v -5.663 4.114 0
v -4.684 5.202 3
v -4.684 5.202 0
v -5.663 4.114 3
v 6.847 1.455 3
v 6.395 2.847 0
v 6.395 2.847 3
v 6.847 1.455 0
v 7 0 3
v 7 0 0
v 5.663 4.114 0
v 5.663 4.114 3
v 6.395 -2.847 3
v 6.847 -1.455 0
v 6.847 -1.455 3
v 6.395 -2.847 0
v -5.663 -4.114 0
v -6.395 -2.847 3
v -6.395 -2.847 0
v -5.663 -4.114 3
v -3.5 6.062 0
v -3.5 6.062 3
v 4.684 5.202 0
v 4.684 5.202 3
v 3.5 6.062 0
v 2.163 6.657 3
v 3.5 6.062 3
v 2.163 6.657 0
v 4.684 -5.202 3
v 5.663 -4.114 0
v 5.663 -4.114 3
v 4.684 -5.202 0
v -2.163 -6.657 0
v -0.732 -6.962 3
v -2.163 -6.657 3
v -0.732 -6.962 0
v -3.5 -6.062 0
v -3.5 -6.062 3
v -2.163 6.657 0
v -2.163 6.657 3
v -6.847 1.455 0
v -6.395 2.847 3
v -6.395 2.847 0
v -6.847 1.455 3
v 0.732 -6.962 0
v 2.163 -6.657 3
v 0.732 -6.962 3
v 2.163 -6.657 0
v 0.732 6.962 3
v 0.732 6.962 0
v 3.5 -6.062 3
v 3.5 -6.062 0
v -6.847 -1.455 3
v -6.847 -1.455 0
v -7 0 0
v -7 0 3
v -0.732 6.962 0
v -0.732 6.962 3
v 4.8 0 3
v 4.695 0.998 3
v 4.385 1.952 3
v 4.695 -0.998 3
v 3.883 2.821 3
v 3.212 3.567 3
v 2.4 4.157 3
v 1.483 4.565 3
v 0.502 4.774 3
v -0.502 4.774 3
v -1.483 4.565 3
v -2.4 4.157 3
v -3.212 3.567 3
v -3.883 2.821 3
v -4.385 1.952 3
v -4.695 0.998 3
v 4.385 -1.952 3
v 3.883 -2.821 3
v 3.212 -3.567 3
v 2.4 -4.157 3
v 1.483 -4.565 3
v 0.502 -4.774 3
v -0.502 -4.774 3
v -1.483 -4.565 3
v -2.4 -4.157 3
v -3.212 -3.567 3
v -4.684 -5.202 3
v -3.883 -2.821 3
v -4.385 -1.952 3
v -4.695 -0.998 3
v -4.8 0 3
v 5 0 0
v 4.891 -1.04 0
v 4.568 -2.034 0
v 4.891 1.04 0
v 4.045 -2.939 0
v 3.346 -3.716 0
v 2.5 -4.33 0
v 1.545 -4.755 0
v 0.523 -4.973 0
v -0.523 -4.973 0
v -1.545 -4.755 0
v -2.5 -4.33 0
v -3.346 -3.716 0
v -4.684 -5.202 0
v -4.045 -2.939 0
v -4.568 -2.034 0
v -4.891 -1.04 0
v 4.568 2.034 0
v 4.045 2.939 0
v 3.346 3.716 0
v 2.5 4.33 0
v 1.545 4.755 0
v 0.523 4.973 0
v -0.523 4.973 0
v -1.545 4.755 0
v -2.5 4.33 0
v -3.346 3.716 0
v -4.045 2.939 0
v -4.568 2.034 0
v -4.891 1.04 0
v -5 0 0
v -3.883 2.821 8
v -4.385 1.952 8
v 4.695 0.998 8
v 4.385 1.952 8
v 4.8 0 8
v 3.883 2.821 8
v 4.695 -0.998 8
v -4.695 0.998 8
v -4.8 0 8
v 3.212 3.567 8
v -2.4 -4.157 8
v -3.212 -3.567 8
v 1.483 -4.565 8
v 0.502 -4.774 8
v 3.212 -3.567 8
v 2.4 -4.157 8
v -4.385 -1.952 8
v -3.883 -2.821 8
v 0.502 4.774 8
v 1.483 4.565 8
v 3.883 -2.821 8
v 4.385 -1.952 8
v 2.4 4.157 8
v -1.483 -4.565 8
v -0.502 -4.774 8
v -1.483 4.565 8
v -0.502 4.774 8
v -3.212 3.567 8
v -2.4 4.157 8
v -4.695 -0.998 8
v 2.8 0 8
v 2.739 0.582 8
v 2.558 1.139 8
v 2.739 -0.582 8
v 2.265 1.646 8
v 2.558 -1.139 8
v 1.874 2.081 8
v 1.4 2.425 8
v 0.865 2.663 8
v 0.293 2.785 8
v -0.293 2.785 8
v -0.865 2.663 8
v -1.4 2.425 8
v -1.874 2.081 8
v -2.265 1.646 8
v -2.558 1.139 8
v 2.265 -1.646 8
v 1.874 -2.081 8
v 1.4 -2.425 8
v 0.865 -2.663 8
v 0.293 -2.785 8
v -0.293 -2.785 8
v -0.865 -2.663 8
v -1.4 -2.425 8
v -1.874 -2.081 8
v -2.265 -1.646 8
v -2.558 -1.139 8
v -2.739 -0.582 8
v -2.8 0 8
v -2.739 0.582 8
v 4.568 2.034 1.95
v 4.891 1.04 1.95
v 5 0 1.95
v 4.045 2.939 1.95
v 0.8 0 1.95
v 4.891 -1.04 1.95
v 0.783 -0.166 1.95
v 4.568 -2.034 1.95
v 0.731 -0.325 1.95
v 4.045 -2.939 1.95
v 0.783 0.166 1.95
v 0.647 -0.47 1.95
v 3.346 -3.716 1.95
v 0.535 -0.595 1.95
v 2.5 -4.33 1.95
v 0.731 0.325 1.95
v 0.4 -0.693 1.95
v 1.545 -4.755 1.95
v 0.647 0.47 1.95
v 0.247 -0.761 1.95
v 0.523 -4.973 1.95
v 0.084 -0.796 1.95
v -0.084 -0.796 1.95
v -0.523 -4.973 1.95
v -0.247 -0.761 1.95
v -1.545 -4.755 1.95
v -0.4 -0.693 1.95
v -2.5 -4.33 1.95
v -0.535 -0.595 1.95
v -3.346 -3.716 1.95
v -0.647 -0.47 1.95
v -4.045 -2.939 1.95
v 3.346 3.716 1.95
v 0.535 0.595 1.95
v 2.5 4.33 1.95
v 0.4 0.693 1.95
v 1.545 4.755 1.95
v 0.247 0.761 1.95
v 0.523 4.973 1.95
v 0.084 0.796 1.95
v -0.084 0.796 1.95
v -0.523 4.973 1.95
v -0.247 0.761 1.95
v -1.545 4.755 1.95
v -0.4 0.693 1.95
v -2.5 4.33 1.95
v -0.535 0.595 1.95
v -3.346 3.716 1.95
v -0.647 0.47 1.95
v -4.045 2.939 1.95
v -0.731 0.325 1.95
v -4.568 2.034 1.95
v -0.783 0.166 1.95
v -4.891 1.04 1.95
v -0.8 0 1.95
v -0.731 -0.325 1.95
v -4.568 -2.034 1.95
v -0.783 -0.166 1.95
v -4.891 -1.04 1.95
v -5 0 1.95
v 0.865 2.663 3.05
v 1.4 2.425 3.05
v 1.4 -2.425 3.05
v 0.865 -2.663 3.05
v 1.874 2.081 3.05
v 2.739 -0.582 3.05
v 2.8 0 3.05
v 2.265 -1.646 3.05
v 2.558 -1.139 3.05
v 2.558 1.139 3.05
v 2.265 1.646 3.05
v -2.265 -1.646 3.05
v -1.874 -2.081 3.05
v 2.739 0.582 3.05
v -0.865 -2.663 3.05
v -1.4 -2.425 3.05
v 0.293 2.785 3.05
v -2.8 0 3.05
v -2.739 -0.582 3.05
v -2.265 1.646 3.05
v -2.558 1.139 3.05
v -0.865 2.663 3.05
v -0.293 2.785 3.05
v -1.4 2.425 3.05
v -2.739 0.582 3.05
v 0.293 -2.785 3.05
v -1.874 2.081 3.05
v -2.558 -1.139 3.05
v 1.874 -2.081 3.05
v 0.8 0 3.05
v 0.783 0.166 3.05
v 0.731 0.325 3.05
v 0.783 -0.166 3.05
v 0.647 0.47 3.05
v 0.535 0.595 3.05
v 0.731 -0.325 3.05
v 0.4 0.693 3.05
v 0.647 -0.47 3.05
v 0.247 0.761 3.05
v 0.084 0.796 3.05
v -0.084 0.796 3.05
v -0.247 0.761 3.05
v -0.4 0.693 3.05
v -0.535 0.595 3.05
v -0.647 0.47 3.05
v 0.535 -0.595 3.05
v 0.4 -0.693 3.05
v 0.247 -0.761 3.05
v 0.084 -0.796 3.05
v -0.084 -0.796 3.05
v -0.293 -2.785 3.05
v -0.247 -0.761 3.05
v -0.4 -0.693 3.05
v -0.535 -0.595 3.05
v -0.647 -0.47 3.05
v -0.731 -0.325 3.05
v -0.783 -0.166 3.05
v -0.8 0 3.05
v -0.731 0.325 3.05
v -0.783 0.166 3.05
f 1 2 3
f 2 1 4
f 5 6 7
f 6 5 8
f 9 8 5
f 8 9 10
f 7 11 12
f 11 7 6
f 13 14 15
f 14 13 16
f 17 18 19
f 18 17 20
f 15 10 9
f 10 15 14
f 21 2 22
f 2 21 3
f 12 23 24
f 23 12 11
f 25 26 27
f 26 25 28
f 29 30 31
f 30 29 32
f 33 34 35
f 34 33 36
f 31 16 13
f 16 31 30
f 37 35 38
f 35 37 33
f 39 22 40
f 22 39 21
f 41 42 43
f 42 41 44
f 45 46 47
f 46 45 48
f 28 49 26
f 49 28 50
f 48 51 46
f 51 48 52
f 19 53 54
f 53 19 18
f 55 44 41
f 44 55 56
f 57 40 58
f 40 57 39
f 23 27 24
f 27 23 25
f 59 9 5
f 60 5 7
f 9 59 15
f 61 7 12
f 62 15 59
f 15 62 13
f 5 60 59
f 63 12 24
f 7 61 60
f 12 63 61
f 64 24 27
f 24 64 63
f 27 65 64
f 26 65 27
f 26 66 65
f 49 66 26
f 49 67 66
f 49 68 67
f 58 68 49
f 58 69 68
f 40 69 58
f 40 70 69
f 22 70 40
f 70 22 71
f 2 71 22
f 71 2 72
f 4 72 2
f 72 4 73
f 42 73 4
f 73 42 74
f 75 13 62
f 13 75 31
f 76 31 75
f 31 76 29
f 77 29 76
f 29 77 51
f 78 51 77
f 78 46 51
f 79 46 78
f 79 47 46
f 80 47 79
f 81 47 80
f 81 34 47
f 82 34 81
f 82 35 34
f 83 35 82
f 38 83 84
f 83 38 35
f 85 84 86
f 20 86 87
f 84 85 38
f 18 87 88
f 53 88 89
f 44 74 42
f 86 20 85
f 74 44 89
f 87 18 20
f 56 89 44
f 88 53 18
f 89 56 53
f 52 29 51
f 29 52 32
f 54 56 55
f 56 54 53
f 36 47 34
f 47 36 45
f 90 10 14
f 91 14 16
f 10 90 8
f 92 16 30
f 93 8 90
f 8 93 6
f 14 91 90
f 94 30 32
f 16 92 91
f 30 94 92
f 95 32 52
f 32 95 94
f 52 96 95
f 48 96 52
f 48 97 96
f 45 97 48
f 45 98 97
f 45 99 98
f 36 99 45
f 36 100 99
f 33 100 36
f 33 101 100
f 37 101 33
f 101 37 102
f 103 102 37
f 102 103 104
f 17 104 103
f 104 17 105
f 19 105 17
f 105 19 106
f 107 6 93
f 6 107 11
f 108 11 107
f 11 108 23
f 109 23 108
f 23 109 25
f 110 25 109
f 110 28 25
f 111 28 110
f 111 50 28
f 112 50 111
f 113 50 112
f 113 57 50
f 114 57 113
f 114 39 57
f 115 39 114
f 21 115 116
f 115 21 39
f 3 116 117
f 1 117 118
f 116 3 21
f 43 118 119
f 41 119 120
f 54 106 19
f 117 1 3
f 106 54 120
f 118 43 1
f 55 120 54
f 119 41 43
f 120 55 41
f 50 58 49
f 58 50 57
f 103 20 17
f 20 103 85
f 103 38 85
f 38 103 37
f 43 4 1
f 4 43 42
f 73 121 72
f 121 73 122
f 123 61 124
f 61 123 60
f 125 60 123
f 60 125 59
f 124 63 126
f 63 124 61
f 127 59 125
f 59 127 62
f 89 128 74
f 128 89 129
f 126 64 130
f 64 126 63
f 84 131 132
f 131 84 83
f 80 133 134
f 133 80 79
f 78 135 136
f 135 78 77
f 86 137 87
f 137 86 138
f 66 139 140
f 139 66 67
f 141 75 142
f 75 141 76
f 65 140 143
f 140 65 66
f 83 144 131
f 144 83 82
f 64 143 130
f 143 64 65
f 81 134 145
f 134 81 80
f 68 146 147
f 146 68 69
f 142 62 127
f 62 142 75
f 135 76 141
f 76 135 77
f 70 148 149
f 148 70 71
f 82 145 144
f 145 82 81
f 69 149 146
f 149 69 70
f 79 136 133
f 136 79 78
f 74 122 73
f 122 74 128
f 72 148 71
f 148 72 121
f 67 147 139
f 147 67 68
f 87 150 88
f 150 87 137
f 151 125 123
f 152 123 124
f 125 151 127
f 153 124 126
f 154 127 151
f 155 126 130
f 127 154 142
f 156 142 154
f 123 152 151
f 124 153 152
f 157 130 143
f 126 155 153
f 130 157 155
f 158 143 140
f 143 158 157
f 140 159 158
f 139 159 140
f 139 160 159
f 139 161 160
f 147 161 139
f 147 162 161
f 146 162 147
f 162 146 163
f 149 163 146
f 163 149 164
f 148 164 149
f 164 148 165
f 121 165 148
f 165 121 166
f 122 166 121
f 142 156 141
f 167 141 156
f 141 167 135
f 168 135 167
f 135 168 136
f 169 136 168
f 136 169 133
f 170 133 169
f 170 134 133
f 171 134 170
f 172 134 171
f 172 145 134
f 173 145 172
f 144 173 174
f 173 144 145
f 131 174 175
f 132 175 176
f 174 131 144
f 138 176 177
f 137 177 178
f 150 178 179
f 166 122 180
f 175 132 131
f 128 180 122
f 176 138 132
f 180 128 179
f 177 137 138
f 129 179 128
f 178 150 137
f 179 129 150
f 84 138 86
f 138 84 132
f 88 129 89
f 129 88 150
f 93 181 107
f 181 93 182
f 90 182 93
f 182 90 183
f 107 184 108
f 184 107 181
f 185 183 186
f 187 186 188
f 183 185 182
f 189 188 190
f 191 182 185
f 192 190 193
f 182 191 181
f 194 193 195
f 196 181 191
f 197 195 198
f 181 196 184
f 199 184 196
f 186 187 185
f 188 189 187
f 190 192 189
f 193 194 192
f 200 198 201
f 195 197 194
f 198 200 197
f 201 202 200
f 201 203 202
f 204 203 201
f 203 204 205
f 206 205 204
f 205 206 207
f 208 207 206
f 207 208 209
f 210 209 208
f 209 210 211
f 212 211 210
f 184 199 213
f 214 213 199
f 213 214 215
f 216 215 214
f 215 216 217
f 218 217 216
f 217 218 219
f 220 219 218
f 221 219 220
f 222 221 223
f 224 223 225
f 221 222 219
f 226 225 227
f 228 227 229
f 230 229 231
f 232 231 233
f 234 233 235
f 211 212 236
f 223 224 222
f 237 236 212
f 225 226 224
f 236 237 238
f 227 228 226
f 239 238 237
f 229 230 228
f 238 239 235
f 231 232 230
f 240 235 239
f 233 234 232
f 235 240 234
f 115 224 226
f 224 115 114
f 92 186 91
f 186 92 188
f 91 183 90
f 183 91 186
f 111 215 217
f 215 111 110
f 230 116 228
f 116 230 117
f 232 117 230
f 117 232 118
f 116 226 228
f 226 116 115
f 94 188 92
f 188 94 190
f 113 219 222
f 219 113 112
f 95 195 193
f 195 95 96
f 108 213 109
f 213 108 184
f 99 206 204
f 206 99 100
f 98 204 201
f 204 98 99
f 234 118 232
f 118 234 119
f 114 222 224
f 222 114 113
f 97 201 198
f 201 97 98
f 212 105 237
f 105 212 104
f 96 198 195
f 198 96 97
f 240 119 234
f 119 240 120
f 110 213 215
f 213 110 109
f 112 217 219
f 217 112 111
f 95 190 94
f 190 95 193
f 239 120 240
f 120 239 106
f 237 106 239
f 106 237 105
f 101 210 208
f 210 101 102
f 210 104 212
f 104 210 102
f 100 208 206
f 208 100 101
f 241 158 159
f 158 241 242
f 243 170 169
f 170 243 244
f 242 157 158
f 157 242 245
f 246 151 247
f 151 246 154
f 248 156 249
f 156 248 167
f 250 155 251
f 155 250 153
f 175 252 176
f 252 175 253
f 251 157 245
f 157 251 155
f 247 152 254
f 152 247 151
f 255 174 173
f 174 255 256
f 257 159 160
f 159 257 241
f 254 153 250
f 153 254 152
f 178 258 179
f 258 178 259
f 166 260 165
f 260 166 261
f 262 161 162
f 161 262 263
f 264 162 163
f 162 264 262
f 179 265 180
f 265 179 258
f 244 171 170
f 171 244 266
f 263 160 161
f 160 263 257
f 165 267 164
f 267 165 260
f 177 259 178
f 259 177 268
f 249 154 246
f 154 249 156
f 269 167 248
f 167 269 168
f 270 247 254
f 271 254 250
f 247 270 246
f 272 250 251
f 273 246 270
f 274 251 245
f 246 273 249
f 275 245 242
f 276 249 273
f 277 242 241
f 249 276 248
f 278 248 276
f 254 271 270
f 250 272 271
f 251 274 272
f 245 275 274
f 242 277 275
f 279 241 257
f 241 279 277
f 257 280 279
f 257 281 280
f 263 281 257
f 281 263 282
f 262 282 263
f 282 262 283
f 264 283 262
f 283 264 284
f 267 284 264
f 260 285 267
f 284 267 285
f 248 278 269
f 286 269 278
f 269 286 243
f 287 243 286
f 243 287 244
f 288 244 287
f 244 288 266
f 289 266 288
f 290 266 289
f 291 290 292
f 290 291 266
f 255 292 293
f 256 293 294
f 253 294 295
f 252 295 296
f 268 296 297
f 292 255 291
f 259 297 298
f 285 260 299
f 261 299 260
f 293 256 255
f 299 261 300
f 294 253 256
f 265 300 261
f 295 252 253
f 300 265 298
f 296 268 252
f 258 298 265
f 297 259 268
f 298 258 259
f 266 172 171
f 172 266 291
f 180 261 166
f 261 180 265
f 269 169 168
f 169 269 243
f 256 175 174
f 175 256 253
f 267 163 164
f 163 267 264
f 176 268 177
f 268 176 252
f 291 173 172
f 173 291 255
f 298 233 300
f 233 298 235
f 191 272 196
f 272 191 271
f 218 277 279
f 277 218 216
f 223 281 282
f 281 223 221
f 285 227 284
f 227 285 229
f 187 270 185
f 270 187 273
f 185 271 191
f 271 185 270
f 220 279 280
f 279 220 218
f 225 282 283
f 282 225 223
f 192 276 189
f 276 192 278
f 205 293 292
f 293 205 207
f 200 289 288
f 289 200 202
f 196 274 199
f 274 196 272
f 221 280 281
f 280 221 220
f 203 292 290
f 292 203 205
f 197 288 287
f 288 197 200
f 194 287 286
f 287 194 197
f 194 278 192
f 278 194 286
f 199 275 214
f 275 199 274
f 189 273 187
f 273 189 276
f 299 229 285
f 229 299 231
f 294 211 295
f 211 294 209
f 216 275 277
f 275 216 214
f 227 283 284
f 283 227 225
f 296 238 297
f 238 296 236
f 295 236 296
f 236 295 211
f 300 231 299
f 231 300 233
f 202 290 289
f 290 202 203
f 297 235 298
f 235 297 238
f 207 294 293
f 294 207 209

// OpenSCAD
// magnet 10x2 holder on 6mm axis with thread

$fn=30;
ov = 0.05; // overshot for crear view

r_mag    = 5.0;
h_mag    = 2.0;
r_axis   = 2.8; // 5.6 = 6.0 - thread
h_axis   = 5.0;
h_mid    = 1.0;
r_out = max(r_mag,r_axis) + 2.0;
h_all = h_mag + h_mid + h_axis;

difference() {
  union() {
    cylinder( h=h_mag+h_mid, r=r_out );
    translate([0,0,h_mag+h_mid]) cylinder( h=h_axis, r=r_axis+2.0 );
  }
  translate([0,0,-ov]) cylinder( h=h_mag, r=r_mag );
  translate([0,0,h_mag+h_mid+ov]) cylinder( h=h_axis, r=r_axis );
  translate([0,0,-ov]) cylinder( h=h_all+2-ov, r=0.8 );
}
